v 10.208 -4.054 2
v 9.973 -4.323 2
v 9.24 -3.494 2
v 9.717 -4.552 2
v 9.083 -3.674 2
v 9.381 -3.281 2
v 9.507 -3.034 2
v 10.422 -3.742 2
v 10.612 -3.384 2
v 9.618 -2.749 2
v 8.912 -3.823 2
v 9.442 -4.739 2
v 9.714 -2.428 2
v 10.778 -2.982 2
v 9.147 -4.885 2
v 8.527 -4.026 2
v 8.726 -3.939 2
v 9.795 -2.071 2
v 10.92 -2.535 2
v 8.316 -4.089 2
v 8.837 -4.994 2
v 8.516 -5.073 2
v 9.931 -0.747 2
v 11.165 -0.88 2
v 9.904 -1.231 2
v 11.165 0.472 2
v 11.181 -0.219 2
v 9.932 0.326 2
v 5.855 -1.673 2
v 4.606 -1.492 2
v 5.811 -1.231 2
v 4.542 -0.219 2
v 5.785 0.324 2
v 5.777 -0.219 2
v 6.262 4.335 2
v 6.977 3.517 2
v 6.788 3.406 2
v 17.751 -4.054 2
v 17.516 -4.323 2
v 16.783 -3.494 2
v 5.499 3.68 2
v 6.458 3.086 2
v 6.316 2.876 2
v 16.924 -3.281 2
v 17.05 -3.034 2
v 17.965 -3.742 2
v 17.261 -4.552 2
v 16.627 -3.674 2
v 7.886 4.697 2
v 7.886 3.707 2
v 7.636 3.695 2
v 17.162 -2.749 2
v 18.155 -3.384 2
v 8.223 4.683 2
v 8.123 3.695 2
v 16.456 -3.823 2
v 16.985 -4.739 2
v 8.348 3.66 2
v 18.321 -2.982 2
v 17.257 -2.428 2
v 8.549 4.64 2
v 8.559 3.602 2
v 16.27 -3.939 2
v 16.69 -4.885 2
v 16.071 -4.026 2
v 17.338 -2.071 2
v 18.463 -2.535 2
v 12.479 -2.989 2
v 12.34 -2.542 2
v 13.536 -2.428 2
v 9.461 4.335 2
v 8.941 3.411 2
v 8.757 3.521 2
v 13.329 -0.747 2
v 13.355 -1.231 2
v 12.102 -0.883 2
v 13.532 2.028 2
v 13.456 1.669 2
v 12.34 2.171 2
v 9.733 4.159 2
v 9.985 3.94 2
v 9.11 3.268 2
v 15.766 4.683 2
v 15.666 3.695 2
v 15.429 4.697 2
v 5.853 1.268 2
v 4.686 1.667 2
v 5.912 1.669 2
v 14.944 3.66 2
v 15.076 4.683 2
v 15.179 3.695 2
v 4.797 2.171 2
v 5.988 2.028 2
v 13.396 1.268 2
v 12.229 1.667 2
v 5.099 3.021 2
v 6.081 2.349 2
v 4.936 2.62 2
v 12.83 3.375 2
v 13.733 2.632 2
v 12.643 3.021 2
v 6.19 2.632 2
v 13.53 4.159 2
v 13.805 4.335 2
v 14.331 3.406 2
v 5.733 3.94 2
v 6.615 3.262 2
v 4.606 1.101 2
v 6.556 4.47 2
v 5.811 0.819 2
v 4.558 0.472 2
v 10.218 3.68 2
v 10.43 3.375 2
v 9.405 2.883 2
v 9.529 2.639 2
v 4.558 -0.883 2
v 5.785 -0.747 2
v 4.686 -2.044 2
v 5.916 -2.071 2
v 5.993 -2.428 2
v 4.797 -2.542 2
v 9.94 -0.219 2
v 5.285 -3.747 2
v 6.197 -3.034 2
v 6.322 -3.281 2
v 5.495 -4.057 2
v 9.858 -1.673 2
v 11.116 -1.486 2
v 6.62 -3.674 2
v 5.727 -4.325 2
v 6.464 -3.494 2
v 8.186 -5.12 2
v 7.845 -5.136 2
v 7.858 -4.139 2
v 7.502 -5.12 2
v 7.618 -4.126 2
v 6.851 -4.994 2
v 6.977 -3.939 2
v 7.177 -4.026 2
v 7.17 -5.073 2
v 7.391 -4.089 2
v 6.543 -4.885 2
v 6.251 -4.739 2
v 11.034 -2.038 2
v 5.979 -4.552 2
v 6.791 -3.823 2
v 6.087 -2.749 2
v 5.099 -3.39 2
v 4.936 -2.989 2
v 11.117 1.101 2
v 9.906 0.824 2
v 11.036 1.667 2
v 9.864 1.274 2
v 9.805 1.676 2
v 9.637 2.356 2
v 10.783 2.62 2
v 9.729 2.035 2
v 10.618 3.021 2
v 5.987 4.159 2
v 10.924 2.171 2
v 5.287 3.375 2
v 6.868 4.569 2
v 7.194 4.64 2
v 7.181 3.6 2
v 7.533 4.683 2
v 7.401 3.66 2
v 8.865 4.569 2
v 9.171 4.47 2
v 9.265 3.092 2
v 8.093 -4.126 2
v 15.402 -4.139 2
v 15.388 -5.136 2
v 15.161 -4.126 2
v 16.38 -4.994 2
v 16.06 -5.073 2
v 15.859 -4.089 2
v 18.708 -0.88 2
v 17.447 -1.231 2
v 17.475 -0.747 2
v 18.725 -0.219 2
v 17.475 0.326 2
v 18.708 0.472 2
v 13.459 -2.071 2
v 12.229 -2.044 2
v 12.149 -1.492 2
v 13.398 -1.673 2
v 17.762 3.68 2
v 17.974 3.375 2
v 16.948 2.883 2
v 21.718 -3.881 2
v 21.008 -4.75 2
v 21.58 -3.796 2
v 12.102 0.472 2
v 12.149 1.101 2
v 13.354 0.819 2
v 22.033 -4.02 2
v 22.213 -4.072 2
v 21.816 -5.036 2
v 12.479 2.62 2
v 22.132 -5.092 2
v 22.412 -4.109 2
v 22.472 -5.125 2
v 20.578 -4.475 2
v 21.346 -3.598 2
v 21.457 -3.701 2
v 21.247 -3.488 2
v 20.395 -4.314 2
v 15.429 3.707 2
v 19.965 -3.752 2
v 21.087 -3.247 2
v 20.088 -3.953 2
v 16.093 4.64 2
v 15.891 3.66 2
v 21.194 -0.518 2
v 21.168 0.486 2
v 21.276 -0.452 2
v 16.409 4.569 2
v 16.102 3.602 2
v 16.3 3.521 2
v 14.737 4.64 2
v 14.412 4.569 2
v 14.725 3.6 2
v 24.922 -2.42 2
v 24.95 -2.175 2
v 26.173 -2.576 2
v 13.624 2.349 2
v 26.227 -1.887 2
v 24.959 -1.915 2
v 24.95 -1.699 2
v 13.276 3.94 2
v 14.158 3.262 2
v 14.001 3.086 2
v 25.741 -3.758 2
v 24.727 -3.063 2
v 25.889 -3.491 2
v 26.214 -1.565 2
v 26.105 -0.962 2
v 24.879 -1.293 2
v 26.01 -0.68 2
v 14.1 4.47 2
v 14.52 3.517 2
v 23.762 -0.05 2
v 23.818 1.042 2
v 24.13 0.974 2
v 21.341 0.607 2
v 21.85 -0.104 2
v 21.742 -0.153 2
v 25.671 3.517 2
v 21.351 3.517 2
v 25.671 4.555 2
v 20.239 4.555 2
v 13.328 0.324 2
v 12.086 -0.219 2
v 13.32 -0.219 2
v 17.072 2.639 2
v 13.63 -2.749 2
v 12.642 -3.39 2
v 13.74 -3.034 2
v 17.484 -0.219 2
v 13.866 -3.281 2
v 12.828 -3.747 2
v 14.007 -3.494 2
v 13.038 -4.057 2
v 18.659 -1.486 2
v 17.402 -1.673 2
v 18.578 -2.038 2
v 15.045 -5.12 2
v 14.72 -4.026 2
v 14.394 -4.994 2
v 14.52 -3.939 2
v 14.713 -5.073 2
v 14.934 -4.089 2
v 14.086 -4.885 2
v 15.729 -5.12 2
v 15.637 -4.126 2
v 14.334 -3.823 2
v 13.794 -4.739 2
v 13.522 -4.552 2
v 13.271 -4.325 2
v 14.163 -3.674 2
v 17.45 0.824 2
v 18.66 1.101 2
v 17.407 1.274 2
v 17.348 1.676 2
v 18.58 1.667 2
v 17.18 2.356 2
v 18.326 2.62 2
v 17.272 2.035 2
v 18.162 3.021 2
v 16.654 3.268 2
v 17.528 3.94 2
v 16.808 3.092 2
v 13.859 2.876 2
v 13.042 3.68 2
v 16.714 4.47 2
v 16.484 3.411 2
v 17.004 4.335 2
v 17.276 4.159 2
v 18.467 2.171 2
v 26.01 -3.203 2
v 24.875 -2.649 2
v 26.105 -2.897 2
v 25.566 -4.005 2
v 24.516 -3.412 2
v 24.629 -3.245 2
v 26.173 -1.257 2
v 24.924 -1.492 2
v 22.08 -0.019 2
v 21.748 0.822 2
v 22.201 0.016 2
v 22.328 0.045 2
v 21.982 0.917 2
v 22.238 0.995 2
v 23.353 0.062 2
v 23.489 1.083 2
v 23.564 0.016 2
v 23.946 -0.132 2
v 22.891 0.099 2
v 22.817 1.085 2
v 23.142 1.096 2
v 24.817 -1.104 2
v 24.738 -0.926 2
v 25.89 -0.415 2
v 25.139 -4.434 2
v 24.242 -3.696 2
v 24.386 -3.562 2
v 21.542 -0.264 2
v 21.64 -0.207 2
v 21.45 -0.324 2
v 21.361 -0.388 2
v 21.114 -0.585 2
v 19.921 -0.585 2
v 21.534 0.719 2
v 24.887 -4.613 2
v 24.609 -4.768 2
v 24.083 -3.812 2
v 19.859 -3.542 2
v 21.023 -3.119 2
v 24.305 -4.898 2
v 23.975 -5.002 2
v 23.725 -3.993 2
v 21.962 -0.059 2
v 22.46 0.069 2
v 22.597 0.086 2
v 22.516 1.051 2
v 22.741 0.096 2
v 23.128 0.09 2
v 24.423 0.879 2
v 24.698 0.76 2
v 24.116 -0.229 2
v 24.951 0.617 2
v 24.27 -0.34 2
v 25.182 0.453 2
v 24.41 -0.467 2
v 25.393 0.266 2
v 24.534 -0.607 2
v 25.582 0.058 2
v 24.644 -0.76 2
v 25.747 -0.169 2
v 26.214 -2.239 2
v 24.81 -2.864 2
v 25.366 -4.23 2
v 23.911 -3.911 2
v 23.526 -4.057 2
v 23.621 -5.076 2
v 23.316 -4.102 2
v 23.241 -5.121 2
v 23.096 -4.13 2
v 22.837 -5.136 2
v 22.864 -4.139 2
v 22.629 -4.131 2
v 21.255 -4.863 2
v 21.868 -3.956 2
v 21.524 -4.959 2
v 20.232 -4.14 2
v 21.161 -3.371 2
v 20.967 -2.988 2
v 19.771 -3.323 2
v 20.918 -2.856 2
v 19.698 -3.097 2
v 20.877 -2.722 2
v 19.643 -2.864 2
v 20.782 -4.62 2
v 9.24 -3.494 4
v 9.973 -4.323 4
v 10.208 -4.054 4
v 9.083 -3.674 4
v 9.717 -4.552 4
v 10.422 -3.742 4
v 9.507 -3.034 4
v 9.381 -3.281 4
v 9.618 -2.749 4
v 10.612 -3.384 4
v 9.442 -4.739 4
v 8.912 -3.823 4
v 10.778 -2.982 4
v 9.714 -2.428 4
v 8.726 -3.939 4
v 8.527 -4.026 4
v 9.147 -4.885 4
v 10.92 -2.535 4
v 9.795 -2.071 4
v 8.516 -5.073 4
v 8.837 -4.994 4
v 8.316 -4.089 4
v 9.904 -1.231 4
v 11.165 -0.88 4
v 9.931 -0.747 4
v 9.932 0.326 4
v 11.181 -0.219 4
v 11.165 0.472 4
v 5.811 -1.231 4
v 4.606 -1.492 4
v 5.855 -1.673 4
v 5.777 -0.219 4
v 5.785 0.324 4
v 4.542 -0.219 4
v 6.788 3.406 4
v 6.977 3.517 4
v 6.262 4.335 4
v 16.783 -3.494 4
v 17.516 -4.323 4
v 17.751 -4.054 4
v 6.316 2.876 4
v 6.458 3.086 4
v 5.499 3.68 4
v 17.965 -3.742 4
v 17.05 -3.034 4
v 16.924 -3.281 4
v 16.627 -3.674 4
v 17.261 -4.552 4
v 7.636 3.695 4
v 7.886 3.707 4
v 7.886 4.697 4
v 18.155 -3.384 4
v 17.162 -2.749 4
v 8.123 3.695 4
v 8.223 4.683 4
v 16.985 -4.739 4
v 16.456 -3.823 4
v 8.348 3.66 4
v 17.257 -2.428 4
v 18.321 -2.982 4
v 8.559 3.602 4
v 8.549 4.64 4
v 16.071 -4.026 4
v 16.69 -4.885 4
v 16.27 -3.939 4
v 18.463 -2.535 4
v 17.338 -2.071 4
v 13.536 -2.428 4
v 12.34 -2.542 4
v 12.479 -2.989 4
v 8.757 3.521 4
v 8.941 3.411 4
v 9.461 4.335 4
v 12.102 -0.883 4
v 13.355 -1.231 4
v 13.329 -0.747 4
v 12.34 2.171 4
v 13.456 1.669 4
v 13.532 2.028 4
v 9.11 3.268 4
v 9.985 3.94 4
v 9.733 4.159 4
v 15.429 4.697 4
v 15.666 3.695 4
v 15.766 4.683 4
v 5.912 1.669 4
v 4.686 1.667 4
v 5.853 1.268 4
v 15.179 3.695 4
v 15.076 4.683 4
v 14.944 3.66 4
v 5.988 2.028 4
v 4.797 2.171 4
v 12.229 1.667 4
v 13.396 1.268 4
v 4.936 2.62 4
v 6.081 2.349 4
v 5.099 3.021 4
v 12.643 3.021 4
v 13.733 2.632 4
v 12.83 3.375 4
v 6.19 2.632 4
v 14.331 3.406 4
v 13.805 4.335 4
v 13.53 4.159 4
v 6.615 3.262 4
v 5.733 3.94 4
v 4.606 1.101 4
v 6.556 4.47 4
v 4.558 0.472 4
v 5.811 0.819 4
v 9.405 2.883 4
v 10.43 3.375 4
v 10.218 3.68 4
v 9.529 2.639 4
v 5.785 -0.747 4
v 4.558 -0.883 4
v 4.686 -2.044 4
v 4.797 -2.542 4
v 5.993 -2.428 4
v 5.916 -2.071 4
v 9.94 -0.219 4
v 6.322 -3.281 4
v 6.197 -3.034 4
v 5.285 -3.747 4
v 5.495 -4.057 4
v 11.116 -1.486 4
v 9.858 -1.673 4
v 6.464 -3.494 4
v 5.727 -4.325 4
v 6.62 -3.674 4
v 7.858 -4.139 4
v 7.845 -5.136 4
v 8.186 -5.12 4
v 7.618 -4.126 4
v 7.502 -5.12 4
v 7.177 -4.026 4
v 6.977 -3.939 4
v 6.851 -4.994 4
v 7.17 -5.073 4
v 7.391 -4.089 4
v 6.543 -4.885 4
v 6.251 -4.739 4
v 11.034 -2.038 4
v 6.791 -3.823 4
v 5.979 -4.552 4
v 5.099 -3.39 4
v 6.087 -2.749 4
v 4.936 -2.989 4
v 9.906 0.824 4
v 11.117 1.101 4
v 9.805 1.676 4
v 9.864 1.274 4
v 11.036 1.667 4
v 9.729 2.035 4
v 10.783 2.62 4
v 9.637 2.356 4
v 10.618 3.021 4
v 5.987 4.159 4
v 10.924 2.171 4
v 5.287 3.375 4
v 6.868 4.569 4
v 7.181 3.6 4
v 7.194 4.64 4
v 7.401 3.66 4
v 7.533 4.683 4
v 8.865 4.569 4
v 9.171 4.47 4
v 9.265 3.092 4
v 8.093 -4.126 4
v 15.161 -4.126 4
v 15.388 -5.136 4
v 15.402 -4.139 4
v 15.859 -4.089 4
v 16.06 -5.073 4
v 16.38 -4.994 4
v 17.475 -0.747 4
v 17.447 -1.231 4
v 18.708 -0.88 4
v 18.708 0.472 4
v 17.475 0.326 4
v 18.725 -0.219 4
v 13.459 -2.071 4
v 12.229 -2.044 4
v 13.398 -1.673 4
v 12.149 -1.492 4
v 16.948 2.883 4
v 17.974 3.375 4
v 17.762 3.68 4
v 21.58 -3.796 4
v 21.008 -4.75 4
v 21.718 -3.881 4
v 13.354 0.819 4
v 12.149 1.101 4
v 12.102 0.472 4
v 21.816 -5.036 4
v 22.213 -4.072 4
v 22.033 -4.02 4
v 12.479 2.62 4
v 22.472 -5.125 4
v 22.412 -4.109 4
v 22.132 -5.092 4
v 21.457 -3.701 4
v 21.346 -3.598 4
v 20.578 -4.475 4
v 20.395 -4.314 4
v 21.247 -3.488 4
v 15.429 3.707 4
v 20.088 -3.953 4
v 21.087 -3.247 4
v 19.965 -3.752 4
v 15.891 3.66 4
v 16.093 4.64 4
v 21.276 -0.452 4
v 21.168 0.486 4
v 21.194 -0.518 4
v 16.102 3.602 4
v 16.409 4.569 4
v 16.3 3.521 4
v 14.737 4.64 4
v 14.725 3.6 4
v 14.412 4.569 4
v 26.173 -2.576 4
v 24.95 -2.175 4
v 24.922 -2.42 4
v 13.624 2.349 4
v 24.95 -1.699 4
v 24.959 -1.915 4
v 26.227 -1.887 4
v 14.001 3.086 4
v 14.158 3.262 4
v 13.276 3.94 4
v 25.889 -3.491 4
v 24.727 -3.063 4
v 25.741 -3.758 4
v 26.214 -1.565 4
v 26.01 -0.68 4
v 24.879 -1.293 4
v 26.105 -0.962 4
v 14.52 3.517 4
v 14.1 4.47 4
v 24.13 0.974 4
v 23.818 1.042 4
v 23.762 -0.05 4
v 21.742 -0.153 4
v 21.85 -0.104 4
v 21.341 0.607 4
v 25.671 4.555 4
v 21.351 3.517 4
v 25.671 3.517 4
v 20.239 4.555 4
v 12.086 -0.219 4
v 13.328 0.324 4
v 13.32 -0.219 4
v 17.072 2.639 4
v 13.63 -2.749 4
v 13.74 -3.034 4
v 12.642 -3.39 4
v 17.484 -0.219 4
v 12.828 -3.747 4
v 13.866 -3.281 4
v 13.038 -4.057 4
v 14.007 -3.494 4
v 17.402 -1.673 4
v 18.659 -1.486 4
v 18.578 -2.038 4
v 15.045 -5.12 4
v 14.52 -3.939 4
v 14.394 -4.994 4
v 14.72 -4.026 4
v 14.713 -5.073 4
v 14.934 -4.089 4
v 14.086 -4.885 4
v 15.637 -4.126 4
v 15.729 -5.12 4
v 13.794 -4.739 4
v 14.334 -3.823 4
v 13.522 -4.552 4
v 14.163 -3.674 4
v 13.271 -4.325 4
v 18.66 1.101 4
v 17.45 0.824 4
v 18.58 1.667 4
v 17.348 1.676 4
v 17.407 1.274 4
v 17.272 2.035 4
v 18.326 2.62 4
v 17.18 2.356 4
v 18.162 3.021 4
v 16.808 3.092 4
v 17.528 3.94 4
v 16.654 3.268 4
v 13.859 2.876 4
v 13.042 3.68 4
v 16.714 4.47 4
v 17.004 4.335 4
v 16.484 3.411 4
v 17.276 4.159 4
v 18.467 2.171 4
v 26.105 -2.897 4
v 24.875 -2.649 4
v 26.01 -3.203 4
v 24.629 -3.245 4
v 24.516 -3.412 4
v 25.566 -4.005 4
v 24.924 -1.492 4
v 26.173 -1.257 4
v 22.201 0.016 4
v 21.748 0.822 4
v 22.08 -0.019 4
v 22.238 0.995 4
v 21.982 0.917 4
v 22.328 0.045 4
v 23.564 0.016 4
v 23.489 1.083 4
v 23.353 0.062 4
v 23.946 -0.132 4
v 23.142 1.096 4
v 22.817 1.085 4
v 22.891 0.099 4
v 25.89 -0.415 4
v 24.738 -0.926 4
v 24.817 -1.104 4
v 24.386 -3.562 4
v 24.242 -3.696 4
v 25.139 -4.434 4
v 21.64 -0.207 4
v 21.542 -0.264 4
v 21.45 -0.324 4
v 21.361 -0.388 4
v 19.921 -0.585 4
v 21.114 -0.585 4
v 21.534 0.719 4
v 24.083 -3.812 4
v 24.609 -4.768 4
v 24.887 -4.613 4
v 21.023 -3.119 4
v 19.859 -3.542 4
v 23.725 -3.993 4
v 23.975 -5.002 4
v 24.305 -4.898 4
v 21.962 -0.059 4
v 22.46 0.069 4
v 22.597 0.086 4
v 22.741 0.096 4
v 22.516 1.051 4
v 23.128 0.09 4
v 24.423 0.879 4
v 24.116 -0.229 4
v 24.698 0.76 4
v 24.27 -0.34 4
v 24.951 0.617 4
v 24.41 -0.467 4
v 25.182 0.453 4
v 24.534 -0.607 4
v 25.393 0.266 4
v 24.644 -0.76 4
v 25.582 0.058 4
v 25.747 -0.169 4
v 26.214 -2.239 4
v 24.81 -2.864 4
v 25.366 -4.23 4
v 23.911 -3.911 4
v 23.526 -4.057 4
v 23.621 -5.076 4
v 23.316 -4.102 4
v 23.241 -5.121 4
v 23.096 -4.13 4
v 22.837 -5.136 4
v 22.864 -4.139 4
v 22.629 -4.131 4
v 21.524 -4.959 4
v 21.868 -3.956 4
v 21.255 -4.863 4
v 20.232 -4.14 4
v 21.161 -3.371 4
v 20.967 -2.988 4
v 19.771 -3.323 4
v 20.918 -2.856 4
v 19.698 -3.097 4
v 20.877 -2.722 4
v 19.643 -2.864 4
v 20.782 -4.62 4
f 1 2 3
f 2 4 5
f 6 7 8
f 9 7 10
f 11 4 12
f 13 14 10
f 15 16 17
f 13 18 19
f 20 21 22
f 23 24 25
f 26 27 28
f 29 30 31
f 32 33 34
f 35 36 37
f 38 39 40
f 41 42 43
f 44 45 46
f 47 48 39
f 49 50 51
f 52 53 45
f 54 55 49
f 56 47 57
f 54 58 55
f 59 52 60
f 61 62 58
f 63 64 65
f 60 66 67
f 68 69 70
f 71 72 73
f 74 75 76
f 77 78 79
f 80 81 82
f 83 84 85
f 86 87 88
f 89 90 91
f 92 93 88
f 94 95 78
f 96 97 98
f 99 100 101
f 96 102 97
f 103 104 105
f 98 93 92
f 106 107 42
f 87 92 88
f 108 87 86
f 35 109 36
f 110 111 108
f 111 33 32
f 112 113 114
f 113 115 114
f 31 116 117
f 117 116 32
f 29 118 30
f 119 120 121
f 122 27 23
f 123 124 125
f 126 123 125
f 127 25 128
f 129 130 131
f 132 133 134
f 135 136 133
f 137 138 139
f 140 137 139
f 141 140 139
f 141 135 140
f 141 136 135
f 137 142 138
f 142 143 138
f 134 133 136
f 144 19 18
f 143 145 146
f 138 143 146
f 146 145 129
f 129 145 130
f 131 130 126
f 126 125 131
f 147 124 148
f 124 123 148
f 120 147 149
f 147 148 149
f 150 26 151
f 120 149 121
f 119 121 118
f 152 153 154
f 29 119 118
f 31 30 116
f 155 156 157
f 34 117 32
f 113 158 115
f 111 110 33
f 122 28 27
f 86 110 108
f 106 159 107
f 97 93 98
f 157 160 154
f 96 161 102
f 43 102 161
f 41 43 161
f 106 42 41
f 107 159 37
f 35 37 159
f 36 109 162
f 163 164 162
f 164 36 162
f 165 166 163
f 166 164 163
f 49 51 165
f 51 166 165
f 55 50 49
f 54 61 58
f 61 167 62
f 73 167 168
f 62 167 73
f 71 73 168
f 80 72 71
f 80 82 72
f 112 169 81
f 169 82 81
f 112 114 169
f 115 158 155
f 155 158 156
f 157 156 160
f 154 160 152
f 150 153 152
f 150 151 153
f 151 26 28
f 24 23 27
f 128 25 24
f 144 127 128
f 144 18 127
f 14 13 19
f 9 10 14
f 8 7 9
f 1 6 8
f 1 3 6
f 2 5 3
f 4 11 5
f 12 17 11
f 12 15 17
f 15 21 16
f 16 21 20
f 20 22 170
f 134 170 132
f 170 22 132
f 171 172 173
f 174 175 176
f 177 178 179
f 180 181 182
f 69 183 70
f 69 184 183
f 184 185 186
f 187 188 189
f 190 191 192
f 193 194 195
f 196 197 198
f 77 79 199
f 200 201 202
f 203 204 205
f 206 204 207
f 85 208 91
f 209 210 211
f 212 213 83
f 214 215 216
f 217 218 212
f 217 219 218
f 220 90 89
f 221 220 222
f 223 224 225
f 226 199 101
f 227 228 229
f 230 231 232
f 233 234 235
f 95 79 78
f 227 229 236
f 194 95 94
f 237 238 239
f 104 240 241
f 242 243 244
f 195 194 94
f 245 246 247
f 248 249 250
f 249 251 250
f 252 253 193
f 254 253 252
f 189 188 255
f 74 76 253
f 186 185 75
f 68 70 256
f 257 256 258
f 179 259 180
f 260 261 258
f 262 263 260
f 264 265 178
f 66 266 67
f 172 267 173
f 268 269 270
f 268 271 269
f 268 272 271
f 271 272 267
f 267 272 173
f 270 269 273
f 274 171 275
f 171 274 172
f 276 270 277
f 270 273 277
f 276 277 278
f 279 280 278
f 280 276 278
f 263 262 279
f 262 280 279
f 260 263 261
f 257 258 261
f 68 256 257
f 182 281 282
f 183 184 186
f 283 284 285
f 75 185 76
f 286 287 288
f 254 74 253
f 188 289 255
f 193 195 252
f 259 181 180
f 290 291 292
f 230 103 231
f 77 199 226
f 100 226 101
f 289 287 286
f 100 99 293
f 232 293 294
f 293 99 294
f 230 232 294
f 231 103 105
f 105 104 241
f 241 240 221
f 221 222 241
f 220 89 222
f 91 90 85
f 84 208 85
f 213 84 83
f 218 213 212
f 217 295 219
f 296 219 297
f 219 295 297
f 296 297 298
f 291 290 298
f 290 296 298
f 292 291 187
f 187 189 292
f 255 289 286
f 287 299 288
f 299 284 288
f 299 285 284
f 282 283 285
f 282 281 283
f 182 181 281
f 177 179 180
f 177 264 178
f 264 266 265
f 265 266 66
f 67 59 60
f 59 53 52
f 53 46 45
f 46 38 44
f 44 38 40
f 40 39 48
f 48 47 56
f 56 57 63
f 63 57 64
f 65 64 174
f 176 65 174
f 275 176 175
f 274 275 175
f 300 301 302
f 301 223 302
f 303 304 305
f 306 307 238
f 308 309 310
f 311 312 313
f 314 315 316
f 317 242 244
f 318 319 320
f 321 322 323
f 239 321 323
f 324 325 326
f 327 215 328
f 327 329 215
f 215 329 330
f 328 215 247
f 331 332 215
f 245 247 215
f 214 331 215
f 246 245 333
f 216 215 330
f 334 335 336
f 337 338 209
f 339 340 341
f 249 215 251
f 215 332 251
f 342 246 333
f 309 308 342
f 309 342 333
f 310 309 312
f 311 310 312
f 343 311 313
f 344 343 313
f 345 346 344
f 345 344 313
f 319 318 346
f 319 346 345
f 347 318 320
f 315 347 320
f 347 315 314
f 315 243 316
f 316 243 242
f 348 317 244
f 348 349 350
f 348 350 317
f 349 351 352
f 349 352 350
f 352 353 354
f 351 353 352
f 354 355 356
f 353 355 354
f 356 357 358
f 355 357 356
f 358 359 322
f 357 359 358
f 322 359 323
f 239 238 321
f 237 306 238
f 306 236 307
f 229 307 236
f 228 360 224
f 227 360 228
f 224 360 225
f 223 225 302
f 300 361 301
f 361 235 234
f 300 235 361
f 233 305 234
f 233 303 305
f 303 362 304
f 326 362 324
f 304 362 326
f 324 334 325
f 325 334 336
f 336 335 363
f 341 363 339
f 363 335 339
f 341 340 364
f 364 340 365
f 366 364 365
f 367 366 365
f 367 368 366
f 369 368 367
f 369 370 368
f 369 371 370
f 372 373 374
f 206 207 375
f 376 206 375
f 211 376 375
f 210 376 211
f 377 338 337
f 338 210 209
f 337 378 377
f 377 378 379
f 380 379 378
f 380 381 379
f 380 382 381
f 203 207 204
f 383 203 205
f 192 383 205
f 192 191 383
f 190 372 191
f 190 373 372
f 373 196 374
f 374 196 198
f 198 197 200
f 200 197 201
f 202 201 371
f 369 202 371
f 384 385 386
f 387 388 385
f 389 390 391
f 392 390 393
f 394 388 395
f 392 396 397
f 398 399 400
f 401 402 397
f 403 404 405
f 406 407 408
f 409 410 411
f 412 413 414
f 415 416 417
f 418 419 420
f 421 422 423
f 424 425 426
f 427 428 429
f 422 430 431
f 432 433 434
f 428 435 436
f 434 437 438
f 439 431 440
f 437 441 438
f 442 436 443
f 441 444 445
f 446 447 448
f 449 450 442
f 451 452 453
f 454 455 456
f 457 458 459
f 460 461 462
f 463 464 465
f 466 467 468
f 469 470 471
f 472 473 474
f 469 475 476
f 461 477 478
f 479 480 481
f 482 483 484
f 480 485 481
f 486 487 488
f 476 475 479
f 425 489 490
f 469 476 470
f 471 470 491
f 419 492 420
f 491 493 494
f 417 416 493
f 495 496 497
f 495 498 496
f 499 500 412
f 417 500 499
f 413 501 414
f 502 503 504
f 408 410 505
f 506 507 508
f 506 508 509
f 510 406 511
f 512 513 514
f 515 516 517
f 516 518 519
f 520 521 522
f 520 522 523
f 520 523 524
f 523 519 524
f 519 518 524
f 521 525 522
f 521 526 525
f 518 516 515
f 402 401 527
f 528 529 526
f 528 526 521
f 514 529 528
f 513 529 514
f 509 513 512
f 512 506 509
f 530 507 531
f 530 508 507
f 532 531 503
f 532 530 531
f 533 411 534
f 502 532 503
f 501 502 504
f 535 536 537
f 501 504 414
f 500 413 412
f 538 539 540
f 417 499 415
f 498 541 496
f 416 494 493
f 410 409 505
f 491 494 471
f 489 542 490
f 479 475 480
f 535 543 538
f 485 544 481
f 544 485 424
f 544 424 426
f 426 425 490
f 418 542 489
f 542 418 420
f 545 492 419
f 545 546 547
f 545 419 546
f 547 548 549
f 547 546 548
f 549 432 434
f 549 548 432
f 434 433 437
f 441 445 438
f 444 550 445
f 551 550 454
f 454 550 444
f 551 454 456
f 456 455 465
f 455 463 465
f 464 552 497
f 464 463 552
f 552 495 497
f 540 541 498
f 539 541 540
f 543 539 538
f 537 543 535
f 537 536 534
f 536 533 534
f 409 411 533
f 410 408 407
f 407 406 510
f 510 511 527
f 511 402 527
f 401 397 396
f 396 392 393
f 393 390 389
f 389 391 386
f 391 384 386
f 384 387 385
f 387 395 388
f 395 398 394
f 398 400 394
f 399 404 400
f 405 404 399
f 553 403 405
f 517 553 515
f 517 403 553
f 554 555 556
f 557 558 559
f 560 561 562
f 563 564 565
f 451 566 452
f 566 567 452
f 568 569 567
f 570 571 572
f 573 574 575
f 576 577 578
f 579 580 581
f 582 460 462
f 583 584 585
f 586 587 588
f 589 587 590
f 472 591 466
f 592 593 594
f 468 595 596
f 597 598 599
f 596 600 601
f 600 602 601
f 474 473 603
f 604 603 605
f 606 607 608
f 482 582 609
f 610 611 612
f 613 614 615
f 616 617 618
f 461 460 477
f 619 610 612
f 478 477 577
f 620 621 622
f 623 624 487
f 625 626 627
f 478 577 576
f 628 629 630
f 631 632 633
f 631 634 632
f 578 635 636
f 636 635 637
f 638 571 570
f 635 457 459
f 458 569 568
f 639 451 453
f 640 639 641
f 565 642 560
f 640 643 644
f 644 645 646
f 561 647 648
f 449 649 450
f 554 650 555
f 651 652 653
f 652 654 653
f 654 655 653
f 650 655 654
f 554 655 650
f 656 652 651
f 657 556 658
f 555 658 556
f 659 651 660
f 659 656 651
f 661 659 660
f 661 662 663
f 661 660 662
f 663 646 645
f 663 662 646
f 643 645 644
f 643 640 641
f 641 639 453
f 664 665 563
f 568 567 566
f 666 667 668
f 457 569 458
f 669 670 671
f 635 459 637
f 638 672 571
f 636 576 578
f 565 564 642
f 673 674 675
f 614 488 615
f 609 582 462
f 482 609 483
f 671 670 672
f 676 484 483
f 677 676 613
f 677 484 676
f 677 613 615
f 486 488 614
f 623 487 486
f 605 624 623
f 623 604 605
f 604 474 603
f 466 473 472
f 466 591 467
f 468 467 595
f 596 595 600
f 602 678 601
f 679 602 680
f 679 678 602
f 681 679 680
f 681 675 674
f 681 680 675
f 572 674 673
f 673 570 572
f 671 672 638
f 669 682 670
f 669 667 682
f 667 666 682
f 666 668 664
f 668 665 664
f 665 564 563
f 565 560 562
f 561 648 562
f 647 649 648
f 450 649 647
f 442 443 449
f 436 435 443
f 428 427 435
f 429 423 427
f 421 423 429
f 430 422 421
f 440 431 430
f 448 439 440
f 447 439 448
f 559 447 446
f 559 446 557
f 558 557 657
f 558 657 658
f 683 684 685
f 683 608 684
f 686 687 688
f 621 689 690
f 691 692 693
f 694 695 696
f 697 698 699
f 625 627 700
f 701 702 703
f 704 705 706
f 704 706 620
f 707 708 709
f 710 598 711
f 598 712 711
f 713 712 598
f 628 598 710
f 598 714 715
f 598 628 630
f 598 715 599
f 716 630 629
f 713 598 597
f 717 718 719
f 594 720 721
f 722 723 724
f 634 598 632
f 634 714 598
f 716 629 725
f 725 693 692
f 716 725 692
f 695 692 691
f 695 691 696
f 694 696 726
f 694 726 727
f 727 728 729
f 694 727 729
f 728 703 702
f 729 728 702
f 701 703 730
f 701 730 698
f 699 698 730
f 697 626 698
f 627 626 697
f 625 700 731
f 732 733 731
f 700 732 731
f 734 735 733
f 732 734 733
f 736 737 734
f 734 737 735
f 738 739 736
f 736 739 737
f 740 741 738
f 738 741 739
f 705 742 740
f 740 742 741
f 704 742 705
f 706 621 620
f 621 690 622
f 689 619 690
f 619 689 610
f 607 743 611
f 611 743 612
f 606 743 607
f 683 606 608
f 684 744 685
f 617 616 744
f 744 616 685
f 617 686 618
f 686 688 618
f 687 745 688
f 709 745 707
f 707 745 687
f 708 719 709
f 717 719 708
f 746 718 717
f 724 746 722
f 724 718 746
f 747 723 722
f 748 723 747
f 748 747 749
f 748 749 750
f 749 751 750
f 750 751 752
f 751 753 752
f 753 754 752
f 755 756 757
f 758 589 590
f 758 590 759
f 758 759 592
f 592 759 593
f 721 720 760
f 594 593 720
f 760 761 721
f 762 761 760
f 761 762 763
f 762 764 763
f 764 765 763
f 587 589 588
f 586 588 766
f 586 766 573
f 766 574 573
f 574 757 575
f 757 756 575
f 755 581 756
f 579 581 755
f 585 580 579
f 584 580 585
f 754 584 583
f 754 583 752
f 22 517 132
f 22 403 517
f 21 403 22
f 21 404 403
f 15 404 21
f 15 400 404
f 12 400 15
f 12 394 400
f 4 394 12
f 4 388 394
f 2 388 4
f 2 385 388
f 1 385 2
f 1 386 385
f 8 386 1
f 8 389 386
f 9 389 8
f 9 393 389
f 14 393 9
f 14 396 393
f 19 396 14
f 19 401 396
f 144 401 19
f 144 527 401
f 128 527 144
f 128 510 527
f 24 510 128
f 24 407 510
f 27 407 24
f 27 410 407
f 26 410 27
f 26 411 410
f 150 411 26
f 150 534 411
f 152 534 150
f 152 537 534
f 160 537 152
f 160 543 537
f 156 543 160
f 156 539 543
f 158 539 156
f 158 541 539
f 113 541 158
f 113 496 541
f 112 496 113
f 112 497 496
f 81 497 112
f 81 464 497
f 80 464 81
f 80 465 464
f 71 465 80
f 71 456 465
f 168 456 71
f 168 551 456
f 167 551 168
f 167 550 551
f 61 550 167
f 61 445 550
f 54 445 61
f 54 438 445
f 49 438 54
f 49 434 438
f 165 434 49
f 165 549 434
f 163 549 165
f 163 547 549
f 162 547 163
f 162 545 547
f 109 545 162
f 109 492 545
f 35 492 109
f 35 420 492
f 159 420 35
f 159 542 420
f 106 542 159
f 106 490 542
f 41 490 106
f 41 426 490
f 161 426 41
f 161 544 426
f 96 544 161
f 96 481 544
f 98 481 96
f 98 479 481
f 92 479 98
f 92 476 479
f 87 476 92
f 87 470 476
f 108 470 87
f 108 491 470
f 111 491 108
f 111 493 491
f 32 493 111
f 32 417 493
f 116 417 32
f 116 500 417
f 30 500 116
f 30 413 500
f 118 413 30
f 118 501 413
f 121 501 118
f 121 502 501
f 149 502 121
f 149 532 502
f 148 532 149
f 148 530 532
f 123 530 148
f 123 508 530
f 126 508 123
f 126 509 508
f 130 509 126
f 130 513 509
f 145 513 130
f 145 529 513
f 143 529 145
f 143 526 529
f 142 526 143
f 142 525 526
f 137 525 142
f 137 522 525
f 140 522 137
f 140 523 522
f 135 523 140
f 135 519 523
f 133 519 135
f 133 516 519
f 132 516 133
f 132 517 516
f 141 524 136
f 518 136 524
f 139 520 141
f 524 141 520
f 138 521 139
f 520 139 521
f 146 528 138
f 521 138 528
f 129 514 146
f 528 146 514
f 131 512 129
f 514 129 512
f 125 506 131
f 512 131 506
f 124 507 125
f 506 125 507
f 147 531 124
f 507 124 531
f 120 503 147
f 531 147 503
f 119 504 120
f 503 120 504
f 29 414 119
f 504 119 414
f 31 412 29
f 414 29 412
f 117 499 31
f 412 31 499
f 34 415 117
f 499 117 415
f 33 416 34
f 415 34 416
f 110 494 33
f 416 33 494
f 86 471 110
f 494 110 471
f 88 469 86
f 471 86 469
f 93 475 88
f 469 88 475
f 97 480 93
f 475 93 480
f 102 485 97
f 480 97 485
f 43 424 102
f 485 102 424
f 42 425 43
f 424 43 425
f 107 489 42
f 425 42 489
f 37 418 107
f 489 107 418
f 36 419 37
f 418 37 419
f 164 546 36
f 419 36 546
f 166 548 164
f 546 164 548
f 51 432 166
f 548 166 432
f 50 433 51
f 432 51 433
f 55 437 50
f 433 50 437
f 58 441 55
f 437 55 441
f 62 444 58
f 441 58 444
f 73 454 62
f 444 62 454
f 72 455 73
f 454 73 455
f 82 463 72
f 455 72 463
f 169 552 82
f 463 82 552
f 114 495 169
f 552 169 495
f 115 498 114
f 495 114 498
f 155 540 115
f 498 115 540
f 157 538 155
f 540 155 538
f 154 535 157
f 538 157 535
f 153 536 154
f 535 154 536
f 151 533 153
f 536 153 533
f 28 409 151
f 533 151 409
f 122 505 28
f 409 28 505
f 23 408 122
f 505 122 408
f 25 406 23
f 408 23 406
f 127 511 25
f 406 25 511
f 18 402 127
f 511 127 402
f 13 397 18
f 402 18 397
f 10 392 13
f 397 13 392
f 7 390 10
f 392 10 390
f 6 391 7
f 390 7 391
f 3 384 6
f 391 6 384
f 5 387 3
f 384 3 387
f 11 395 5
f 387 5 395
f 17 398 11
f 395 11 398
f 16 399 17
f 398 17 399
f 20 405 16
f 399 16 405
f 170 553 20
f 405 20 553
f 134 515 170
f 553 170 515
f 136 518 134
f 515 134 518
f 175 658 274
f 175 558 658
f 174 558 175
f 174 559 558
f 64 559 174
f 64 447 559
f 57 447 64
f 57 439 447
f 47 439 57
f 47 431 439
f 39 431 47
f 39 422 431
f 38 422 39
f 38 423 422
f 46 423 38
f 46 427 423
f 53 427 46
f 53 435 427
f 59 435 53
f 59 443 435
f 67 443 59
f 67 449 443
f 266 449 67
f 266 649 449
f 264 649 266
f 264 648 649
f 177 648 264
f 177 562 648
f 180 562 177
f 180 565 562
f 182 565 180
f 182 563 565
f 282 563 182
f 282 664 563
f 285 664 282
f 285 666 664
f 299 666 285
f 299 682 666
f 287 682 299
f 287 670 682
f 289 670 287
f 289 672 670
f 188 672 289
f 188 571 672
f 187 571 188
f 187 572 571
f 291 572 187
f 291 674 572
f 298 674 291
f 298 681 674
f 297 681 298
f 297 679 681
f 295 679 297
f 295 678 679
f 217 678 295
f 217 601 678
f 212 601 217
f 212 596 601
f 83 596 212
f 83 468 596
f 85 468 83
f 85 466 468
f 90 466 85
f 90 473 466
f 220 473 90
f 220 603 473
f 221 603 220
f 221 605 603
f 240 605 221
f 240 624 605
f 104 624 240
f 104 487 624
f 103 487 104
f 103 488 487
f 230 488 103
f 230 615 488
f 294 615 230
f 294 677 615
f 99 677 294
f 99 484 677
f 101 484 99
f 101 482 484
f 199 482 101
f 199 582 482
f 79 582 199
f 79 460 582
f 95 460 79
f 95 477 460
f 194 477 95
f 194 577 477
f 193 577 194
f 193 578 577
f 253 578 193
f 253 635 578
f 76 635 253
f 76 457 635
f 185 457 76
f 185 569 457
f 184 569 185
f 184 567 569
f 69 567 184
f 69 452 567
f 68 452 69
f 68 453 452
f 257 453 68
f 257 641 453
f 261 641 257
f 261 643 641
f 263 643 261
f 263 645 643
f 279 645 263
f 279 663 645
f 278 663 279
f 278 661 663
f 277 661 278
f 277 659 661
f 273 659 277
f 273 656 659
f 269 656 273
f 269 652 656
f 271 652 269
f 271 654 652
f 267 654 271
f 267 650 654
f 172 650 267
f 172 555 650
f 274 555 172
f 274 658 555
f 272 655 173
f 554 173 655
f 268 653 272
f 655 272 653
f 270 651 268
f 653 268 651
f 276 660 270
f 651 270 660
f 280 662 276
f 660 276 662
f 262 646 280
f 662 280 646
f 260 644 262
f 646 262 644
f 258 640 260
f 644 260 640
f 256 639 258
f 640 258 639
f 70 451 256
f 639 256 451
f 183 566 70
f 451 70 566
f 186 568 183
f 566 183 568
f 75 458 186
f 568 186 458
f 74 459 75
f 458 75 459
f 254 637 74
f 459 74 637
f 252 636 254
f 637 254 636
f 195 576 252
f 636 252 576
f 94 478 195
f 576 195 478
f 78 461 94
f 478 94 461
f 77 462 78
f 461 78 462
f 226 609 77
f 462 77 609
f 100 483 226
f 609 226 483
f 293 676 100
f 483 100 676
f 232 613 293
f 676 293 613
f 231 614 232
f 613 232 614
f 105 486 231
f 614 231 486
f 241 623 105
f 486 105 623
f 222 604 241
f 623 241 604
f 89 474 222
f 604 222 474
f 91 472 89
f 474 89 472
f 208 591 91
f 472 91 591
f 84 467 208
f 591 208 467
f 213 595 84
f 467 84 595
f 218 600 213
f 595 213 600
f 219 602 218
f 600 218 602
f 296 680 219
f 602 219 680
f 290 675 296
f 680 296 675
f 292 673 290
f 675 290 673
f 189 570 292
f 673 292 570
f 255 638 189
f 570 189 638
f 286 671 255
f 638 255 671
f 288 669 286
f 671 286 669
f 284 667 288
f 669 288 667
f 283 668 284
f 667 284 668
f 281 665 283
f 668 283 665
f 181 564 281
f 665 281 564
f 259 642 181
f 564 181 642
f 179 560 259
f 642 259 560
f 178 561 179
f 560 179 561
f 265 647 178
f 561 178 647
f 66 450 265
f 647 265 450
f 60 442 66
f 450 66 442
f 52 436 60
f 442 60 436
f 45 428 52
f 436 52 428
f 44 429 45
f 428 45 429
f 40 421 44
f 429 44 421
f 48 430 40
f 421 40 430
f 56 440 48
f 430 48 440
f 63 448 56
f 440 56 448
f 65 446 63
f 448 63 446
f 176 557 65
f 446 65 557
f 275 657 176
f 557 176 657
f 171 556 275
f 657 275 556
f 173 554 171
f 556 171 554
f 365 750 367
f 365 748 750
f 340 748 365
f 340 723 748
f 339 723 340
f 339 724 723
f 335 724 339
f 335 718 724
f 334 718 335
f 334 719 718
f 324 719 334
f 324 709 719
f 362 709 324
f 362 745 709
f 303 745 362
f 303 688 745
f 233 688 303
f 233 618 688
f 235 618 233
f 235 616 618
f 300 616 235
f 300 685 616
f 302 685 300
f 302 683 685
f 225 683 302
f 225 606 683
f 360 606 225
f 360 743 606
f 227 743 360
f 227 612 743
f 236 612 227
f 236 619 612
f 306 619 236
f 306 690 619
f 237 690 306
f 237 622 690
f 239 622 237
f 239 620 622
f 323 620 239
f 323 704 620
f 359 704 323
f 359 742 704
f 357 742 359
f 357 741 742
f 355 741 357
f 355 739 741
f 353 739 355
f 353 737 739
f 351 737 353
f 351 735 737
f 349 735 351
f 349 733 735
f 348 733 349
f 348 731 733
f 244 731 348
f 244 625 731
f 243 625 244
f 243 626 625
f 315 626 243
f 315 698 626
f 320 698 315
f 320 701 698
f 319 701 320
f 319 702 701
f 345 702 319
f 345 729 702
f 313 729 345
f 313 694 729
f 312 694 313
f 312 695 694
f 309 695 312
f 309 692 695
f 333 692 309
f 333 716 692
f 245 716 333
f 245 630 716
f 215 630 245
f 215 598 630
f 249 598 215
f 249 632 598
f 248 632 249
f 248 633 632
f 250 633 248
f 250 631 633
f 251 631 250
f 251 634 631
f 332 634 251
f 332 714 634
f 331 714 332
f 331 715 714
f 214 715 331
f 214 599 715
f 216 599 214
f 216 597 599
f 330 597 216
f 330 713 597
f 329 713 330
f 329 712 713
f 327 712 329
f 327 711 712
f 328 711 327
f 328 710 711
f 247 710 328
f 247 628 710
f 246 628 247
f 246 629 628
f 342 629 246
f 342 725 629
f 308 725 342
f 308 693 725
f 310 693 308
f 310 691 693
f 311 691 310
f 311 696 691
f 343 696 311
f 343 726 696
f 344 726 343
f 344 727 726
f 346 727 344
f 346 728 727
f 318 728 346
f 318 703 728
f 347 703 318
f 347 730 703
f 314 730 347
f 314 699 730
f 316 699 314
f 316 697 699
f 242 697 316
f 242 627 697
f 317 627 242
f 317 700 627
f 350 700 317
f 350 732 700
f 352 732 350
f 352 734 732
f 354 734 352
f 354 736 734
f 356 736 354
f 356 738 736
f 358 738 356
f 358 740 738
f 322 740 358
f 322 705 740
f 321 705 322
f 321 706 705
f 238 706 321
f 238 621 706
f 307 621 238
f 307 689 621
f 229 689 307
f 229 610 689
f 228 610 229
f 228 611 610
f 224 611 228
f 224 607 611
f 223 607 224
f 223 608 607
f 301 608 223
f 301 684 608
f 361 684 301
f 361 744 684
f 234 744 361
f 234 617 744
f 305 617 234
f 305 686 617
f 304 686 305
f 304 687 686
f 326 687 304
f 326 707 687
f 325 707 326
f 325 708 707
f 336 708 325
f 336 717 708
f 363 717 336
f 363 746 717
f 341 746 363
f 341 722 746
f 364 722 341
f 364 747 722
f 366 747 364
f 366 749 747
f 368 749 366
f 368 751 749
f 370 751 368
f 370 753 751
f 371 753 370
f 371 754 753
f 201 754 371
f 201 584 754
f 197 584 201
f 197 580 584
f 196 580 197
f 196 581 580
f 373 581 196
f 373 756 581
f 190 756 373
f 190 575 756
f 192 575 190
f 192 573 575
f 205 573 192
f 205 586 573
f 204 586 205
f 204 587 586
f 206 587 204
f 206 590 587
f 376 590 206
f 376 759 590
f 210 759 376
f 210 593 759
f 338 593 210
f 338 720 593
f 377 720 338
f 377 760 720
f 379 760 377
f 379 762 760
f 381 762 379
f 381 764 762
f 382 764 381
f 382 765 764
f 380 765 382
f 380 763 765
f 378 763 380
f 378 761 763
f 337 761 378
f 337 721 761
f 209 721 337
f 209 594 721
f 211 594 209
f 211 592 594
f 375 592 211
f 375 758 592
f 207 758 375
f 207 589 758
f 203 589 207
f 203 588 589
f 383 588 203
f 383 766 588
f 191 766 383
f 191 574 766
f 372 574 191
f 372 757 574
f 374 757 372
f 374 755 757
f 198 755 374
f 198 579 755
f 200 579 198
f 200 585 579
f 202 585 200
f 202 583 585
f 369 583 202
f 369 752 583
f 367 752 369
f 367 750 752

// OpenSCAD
//use<roundCornersCube.scad>;
//Disable $fn and $fa, do not change these
//$fn=100;
//$fa=0.01;

//$fs=0.2;
//Numero para imprimir
num=5;


module number(num){
    if (num<10){
        echo("Menor que 10");
    translate([4, -5,2])linear_extrude(2)text(text=str("00",num));
    }
    else if (num<100){
        echo("Menor que 100");
    translate([4, -5,2])linear_extrude(2)text(text=str("0",num));
    }
    else{
       echo("Mayor que 100");
       translate([4, -5,2])linear_extrude(2)text(text=str(num));
    }
}

number(num); 
